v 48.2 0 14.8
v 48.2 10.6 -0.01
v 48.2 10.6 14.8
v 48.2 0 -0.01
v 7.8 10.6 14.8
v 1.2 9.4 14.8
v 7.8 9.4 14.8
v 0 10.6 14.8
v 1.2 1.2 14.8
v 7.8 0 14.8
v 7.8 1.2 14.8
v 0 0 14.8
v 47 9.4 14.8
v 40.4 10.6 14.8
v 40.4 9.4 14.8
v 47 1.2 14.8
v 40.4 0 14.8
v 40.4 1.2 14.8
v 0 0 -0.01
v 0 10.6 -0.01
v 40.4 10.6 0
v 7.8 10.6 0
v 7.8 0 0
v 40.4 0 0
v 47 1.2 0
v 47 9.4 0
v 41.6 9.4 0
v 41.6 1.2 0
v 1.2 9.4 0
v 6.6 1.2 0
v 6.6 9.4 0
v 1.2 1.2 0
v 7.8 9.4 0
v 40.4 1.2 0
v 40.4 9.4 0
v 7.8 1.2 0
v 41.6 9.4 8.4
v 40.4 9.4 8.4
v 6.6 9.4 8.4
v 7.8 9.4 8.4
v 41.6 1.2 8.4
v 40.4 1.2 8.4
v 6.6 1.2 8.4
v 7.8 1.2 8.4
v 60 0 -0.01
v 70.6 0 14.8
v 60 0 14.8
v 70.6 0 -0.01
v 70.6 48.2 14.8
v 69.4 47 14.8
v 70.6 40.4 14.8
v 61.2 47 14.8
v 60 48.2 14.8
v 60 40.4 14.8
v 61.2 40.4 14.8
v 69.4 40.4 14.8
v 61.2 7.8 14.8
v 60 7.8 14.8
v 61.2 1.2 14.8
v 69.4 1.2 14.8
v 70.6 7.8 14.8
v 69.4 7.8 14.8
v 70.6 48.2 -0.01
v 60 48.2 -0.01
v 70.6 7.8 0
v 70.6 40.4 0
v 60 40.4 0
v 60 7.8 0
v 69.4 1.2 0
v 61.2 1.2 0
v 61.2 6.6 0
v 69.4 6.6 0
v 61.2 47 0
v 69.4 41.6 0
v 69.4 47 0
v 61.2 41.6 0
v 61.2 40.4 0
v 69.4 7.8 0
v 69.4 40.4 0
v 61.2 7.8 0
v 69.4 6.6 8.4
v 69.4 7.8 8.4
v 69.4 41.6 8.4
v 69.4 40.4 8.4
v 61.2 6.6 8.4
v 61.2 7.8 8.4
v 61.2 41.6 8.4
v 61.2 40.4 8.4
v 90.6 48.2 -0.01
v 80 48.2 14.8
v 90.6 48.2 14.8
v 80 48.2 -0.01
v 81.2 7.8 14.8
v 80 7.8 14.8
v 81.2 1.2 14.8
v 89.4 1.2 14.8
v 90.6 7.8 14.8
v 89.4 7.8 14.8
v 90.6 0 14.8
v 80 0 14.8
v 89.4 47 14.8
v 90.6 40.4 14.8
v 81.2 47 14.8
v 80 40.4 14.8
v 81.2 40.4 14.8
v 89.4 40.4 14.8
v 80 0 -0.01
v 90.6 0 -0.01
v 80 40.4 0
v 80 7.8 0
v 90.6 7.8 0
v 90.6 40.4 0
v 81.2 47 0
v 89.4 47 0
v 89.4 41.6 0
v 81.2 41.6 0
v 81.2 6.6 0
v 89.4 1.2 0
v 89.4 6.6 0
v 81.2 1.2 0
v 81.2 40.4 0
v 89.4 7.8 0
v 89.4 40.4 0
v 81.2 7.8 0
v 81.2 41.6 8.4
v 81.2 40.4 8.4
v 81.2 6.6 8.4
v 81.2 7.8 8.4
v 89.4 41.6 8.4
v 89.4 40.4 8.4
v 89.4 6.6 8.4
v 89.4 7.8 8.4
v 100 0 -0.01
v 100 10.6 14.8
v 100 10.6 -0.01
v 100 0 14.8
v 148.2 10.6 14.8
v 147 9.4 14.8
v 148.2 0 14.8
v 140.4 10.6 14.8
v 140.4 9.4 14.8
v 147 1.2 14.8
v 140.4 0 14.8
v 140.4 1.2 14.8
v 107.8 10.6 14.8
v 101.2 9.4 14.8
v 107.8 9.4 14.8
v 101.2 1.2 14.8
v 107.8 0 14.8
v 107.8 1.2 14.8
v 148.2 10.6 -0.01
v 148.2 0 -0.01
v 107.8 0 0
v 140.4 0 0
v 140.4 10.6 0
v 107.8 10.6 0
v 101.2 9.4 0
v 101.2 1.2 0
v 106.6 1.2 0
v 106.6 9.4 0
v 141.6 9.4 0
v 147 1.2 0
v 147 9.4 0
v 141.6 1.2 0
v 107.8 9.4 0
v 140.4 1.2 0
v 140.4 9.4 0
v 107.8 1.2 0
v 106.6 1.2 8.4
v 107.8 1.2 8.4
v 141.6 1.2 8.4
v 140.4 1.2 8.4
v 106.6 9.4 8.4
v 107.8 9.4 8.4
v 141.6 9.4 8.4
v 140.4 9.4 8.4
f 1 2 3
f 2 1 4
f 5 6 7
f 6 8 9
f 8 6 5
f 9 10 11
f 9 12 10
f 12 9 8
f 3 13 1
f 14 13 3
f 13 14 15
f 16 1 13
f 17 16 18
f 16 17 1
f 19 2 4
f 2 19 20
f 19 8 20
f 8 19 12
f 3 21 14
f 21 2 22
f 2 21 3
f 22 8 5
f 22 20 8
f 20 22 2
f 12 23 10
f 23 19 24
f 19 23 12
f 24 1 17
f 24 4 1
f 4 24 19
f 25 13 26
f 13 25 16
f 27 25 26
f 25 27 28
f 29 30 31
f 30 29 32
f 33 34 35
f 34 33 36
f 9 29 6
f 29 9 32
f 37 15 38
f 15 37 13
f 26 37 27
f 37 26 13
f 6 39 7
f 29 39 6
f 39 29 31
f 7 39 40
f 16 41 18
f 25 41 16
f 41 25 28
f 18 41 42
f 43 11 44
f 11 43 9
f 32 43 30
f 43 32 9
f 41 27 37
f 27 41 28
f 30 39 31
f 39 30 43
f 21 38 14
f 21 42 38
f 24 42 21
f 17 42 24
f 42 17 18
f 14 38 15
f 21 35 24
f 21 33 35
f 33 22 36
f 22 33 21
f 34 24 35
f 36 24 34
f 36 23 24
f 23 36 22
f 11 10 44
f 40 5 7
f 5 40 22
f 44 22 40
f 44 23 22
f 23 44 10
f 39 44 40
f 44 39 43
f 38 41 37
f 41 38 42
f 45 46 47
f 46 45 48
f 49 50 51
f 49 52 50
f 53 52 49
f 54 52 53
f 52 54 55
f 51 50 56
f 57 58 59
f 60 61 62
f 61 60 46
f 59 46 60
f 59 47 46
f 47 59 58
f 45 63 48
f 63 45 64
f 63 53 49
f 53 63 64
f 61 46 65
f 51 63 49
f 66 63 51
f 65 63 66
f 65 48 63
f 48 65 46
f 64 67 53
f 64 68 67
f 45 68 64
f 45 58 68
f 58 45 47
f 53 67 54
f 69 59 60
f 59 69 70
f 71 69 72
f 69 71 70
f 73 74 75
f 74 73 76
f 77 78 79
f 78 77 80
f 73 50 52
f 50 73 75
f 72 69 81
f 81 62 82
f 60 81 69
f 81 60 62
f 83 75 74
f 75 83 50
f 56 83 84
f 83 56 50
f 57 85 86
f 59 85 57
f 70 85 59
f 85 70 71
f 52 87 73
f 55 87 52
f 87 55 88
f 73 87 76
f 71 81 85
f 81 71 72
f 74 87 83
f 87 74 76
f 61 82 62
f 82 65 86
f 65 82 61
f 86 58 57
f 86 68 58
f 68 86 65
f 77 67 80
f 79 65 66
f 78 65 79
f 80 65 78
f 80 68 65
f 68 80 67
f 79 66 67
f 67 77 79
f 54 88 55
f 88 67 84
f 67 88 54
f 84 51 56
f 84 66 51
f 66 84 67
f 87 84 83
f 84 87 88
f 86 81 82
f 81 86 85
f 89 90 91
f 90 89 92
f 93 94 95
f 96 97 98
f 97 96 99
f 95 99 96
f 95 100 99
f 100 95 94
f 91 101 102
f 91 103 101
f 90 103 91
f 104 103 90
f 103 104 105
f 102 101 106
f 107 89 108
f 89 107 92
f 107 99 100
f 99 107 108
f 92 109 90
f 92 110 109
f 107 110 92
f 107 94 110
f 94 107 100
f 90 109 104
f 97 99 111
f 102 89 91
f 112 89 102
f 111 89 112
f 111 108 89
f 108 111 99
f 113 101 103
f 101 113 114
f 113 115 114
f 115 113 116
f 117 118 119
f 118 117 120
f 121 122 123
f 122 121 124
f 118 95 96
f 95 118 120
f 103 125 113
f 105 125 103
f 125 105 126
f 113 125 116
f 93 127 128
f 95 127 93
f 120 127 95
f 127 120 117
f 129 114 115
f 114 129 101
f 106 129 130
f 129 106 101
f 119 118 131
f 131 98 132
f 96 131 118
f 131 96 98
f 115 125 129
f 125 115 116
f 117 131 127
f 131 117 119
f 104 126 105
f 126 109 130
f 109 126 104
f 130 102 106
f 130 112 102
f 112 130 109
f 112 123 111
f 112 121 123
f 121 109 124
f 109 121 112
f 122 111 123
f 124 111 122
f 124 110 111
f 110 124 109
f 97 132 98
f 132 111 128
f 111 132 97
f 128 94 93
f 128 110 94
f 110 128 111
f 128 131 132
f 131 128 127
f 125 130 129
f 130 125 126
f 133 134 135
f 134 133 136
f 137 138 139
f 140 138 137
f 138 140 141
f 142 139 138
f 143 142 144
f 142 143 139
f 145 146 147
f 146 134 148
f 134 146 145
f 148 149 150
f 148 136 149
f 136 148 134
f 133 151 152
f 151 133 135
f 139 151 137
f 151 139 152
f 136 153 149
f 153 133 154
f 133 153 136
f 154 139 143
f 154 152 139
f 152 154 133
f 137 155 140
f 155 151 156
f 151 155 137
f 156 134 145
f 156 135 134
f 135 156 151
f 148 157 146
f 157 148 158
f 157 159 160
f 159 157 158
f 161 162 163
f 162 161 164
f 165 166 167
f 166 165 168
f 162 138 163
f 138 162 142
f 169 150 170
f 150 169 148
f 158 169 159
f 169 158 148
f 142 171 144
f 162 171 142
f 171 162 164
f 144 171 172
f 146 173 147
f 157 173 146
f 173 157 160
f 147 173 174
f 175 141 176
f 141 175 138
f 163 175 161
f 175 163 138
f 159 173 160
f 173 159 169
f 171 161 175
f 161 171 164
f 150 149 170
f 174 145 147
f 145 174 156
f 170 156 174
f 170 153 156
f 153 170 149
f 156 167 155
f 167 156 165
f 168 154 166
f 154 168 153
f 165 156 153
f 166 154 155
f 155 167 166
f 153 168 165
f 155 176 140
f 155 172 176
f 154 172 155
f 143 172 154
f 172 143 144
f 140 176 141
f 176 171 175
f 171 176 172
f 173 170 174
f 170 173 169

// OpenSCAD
// file: ../../Base/Boxes.scad
// Fischertechnik Box Foundation
// Pre-designed Boxes

use <Constants.scad>

include <PlacementOptions.scad>

box190Width = 190;
box190Depth = 130;
box130Width = 130;
box130Depth = 95;
boxUsageHeight = 33.9;
boxWallThickness = 2.4;
boxBaseThickness = 1.0;

// getBoxWallThickness()
// Gets the wall thickness of a Fischertechnik Box

function getBoxWallThickness() = boxWallThickness;

// Gets the usable height of a fischertechnik box
function getBoxUsageHeight() = boxUsageHeight;

// Gets the thickness of the Fischertechnik box base.
function getBoxBaseThickness() = boxBaseThickness;

// Gets the usable inner space of a Box 190 as an x/y-list
function getBox190Space() = [
    box190Width - 2*getBoxWallThickness(), 
    box190Depth - 2*getBoxWallThickness() ];

// Imports the Fischertechnik empty box 130x190 mm and places it at position 0,0
// 190x130 are the outer sizes, the inner space is slightly smaller. Use getBox190Space() to get the inner sizes.
// This module needs the STL file "Fischertechnik Box 130x190.stl" in the library path.
// The box is positioned that the usable inner space is at the 0,0,0 position. The

module Box190() {
    translate([-getBoxWallThickness(),-getBoxWallThickness(),-getBoxBaseThickness()])
        import("Fischertechnik Box 130x190.stl", convexity=3);
}

// Gets the usable inner space of a Box 130 as an x/y-list
function getBox130Space() = [
    box130Width - 2*getBoxWallThickness(), 
    box130Depth - 2*getBoxWallThickness() ];

// Imports the Fischertechnik empty box 95x130 mm and places it at position 0,0
// 190x130 are the outer sizes, the inner space is slightly smaller. Use getBox190Space() to get the inner sizes.
// This module needs the STL file "Fischertechnik Box 95x130.stl" in the library path.
// The box is positioned that the usable inner space is at the 0,0,0 position. The

module Box130() {
    translate([-getBoxWallThickness(),-getBoxWallThickness(),-getBoxBaseThickness()])
        import("Fischertechnik Box 95x130.stl", convexity=3);
}

// Creates a web at the specified box walls
// corner 0 = LowerLeft, 1 = UpperLeft, 2 = UpperRight, 3 = LowerRight
// side 0 = LeftOfCorner, 1 = RightOfCorner
// distance = Distance in mm from the corner
// box = inner width and depth of the box (default: Box 190)
// webWidth = length of the web (default is 3 mms)
// webThickness = thickness of the web (default is 1 mm)

module BoxWeb(corner, side, distance, box=getBox190Space(), webWidth=3, webThickness=1.0) {
    sink = getBoxWallThickness()/2;

    width = (corner % 2 == 0) ? 
            (side == LeftOfCorner ? webWidth : webThickness) :
            (side == LeftOfCorner ? webThickness : webWidth);

    depth = (corner % 2 == 0) ? 
            (side == RightOfCorner ? webWidth : webThickness) :
            (side == RightOfCorner ? webThickness : webWidth);
    
    xDiff = corner == LowerLeft ? 
                (side == LeftOfCorner ? -sink : distance) :
            (corner == UpperLeft ?                
                (side == LeftOfCorner ? distance : -sink) :
            (corner == UpperRight ?
                (side == LeftOfCorner ? box.x-webWidth+sink : box.x-distance-webThickness) :
                (side == LeftOfCorner ? box.x-distance-webThickness: box.x-webWidth+sink)));

    yDiff = corner == LowerLeft ? 
                (side == RightOfCorner ? -sink : distance) :
            (corner == UpperLeft ?
                (side == RightOfCorner ? box.y-distance : box.y-webWidth+sink) :
            (corner == UpperRight ?
                (side == RightOfCorner ? box.y-webWidth+sink : box.y-distance) :
                (side == RightOfCorner ? distance : -sink)));
    
    translate([xDiff, yDiff, -getExcess()])
        cube([width, depth, boxUsageHeight + 2*getExcess()]);
}
// file: ../../Base/Rotation.scad
// Fischertechnik Box Foundation
// Geometry Helpers Rotation

include <PlacementOptions.scad>

// getRotatedSpace(space, rotation=NoRotation)
// Rotates the space dependent on the specified rotation

function getRotatedSpace(space, rotation=NoRotation) = [
    (rotation == Rotate90 || rotation == Rotate270) ? space.y : space.x,
    (rotation == Rotate90 || rotation == Rotate270) ? space.x : space.y
];

// Rotates the given space around the fixed left lower corner
// space = the space the children needs as width/depth list [width,depth]
// rotation = 0 Rotate0 degrees, 1 Rotate90 degrees, 2 Rotate180 degrees, 3 Rotate270 degrees (equivalent to -90)

module RotateFix(space, rotation=Rotate0) {
    dy = (rotation == Rotate0 || rotation == Rotate270) ? 0 :
        (rotation == Rotate90) ? space.x :
        space.y;
    dx = (rotation < Rotate180) ? 0 :
        (rotation == Rotate180) ? space.x :
        space.y;
    
    translate([dx, dy, 0])
        rotate([0, 0, rotations[rotation]])
            children();
}
// file: ../../Base/Alignment.scad
// Fischertechnik Box Foundation
// Geometry Helpers Alignment

include <PlacementOptions.scad>

// getAlignedX(elementWidth, spaceWidth, align=AlignRight, offset=0)
// Gets the aligned X offset of an element with the given
// width in the given space.
// elementWidth = The width of the element to positon
// spaceWidth = The space where the element should be aligned
// align = 0 AlignLeft, 1 AlignCenter, 2 AlignRight
// offset = an optional offset from the aligned position. When
// aligned left or centered, then positive values are in X direction.
// When aligned right then positive values are in negative X direction.

function getAlignedX(elementWidth, spaceWidth, align=AlignRight, offset=0) =
    (align == AlignLeft) ?
        offset :
        ((align == AlignCenter) ?
        (spaceWidth - elementWidth)/2 + offset :
        spaceWidth - offset - elementWidth);

// getAlignedY(elementDepth, spaceDepth, align=AlignTop, offset=0)
// Gets the aligned Y offset of an element with the given
// depth in the given space.
// elementDepth = The depth of the element to positon
// spaceDepth = The space where the element should be aligned
// align = 0 AlignBottom, 1 AlignCenter, 2 AlignTop
// offset = an optional offset from the aligned position. When
// aligned bottom or centered, then positive values are in Y direction.
// When aligned top then positive values are in negative Y direction.

function getAlignedY(elementDepth, spaceDepth, align=AlignTop, offset=0) =
    (align == AlignBottom) ?
        offset :
        ((align == AlignCenter) ?
        (spaceDepth - elementDepth)/2 + offset :
        spaceDepth - offset - elementDepth);
// file: ../../Base/Constants.scad
// Fischertechnik Box Foundation
// Constants

// Constant values necessary for multiple elements

// Base constants
dividerThickness = 1.2;
excess = 0.01;
fragments = 90;
tolerance = 0.8;

// Gets the thickness of a divider 
function getDividerThickness() = dividerThickness;

// Gets the excess that is used to merge walls into each other
function getExcess() = excess;

// Gets amount of fragments of a cylinder
function getFragments() = fragments;

// Gets the inner tolerance of a frame to each side
function getTolerance() = tolerance;


// Fischertechnik specific constants
axisDiameter = 4;
axisBottomDiameter = axisDiameter + 1;
standardEdgeDistance = 2.5;
standardWebDistance = 11.5;
standardCornerLength = 15;
tubeWallFactor = 1.6;

// Gets axis diameter
function getAxisDiameter() = axisDiameter;

// Gets axis bottom diameter for thicker part at the bottom
function getAxisBottomDiameter() = axisBottomDiameter;

// gets the standard distance to the wall of the box for dockable frames with webs
function getStandardEdgeDistance() = standardEdgeDistance;

// gets the standard distance of each web to the corner of the dockable frame
function getStandardWebDistance() = standardWebDistance;

// gets the standard length of the corner walls of a dockable frame
function getStandardCornerLength() = standardCornerLength;

// gets the wall thickness of a tube.
function getTubeWallThickness() = tubeWallFactor * getDividerThickness();
// file: ../../Base/PlacementOptions.scad
// Fischertechnik Box Foundation
// Placement Options

// Alignment
NoAlign = 0;
AlignLeft = 1;
AlignBottom = 2;
AlignCenter = 3;
AlignRight = 4;
AlignTop = 5;

// Element rotation degree steps
rotations = [0, -90, -180, -270];

// Rotation
NoRotation = 0;
Rotate0 = 0;
Rotate90 = 1;
Rotate180 = 2;
Rotate270 = 3;

// Docking (seen from above)
NoDock = -1;
DockLeft = 0;
DockTop = 1;
DockRight = 2;
DockCorner = 2;
DockBottom = 3;

// Web corners
LowerLeft = 0;
UpperLeft = 1;
UpperRight = 2;
LowerRight = 3;

// Web position relative to corner
LeftOfCorner = 0;
RightOfCorner = 1;
// file: ../../Elements/FrameTwoConnectors45.scad
// Fischertechnik Box Library
// Frame for two Connectors 45
// 31330

use <../ModelBase/Complex.scad>

width = 45;
depth = 8.2;
height = 14.8;

// getFrameTwoConnectors45Space()
// Gets the space needed for the frame for two connectors 45.
function getFrameTwoConnectors45Space() = getElevatedFramesWithCutoffSpace([width, depth, height]);

// FrameTwoConnectors45()
// Frame for two connectors 45

module FrameTwoConnectors45() {    
    bearingLength = 6.6;
    loadHeight = 6.4;
    
    ElevatedFramesWithCutoff([width, depth, loadHeight], depth, height, bearingLength);
}

// Test
color("lightgray")
FrameTwoConnectors45();
// file: ../../Base/Placement.scad
// Fischertechnik Box Foundation
// Geometry Helpers Placement

use <Constants.scad>
use <Alignment.scad>
use <Rotation.scad>
use <Boxes.scad>

include <PlacementOptions.scad>

// Place(x=0, y=0, elementSpace=[0,0], alignX=AlignLeft, alignY=AlignBottom, rotation=Rotate0, boxSpace=getBox190Space())
// Places the child at the specified position
// y = Y-Position. This is a relative position when an X aligment is specified.
// x = X-Position. This is a relative position when an Y aligment is specified.
// elementSpace = space of the element to be placed [x,y]
// alignX = -1=NoAlign, 0 AlignLeft, 1 AlignCenter, 3 AlignRight (elementSpace and boxSpace required!)
// alignY = -1=NoAlign, 2 AlignBottom, 1 AlignCenter, 4 AlignTop (elementSpace and boxSpace required!)
// rotation = 0 Rotate0 0 degrees, 1 Rotate90 90 degrees, 
// 2 Rotate180 180 degrees, 3 Rotate270 270 degrees (equivalent to -90)
// boxSpace = Inner space of the box where the placement occurs [x,y] - default is Box 190x130 inner space

module Place(x=0, y=0, elementSpace=[0,0], 
  alignX=AlignLeft, alignY=AlignBottom, 
  rotation=NoRotation, boxSpace=getBox190Space()) {

    module Position(x, y, space, rotation=Rotate0) {
        translate([x, y, 0])
            RotateFix(space, rotation)
                children(0);
    }

    space = getRotatedSpace(elementSpace, rotation);
    alignedX = getAlignedX(space.x, boxSpace.x, alignX, x);
    alignedY = getAlignedY(space.y, boxSpace.y, alignY, y);
    Position(alignedX, alignedY, elementSpace, rotation)
        children(0);
}

// Center(space=getBox130Space(), elementSpace=[0,0])
// space = Space where the children is centered. For cylinder use centered=true and no elementSpace.
// elementSpace = space of the element to be centered [x,y]

module Center(space=getBox190Space(), elementSpace=[0,0]) {
    translate([(space.x - elementSpace.x) / 2, (space.y - elementSpace.y) / 2])
        children(0);
}

// CenterHorizontal(width=0, y=0, offset=0, space=getBox130Space())
// space = Space where the children is centered. For cylinder use centered=true and no elementSpace.
// elementSpace = space of the element to be centered [x,y]

module CenterHorizontal(width=0, y=0, offset=0, space=getBox190Space()) {
    translate([(space.x - width) / 2 + offset, y])
        children(0);
}

// CenterVertical(depth=0, x=0, offset=0, space=getBox130Space())
// space = Space where the children is centered. For cylinder use centered=true and no elementSpace.
// elementSpace = space of the element to be centered [x,y]

module CenterVerticalal(depth=0, x=0, offset=0, space=getBox190Space()) {
    translate([x, (space.y - depth) / 2 + offset])
        children(0);
}
// main file
// Fischertechnik Box Foundation
// Elements
// Test FrameTwoConnectors30

use <../../Base/Placement.scad>
use <../../Elements/FrameTwoConnectors45.scad>

include <../../Base/PlacementOptions.scad>

FrameTwoConnectors45();

Place(60, 0, getFrameTwoConnectors45Space(), rotation=Rotate90)
    FrameTwoConnectors45();

Place(80, 0, getFrameTwoConnectors45Space(), rotation=Rotate270)
    FrameTwoConnectors45();

Place(100, 0, getFrameTwoConnectors45Space(), rotation=Rotate180)
    FrameTwoConnectors45();
